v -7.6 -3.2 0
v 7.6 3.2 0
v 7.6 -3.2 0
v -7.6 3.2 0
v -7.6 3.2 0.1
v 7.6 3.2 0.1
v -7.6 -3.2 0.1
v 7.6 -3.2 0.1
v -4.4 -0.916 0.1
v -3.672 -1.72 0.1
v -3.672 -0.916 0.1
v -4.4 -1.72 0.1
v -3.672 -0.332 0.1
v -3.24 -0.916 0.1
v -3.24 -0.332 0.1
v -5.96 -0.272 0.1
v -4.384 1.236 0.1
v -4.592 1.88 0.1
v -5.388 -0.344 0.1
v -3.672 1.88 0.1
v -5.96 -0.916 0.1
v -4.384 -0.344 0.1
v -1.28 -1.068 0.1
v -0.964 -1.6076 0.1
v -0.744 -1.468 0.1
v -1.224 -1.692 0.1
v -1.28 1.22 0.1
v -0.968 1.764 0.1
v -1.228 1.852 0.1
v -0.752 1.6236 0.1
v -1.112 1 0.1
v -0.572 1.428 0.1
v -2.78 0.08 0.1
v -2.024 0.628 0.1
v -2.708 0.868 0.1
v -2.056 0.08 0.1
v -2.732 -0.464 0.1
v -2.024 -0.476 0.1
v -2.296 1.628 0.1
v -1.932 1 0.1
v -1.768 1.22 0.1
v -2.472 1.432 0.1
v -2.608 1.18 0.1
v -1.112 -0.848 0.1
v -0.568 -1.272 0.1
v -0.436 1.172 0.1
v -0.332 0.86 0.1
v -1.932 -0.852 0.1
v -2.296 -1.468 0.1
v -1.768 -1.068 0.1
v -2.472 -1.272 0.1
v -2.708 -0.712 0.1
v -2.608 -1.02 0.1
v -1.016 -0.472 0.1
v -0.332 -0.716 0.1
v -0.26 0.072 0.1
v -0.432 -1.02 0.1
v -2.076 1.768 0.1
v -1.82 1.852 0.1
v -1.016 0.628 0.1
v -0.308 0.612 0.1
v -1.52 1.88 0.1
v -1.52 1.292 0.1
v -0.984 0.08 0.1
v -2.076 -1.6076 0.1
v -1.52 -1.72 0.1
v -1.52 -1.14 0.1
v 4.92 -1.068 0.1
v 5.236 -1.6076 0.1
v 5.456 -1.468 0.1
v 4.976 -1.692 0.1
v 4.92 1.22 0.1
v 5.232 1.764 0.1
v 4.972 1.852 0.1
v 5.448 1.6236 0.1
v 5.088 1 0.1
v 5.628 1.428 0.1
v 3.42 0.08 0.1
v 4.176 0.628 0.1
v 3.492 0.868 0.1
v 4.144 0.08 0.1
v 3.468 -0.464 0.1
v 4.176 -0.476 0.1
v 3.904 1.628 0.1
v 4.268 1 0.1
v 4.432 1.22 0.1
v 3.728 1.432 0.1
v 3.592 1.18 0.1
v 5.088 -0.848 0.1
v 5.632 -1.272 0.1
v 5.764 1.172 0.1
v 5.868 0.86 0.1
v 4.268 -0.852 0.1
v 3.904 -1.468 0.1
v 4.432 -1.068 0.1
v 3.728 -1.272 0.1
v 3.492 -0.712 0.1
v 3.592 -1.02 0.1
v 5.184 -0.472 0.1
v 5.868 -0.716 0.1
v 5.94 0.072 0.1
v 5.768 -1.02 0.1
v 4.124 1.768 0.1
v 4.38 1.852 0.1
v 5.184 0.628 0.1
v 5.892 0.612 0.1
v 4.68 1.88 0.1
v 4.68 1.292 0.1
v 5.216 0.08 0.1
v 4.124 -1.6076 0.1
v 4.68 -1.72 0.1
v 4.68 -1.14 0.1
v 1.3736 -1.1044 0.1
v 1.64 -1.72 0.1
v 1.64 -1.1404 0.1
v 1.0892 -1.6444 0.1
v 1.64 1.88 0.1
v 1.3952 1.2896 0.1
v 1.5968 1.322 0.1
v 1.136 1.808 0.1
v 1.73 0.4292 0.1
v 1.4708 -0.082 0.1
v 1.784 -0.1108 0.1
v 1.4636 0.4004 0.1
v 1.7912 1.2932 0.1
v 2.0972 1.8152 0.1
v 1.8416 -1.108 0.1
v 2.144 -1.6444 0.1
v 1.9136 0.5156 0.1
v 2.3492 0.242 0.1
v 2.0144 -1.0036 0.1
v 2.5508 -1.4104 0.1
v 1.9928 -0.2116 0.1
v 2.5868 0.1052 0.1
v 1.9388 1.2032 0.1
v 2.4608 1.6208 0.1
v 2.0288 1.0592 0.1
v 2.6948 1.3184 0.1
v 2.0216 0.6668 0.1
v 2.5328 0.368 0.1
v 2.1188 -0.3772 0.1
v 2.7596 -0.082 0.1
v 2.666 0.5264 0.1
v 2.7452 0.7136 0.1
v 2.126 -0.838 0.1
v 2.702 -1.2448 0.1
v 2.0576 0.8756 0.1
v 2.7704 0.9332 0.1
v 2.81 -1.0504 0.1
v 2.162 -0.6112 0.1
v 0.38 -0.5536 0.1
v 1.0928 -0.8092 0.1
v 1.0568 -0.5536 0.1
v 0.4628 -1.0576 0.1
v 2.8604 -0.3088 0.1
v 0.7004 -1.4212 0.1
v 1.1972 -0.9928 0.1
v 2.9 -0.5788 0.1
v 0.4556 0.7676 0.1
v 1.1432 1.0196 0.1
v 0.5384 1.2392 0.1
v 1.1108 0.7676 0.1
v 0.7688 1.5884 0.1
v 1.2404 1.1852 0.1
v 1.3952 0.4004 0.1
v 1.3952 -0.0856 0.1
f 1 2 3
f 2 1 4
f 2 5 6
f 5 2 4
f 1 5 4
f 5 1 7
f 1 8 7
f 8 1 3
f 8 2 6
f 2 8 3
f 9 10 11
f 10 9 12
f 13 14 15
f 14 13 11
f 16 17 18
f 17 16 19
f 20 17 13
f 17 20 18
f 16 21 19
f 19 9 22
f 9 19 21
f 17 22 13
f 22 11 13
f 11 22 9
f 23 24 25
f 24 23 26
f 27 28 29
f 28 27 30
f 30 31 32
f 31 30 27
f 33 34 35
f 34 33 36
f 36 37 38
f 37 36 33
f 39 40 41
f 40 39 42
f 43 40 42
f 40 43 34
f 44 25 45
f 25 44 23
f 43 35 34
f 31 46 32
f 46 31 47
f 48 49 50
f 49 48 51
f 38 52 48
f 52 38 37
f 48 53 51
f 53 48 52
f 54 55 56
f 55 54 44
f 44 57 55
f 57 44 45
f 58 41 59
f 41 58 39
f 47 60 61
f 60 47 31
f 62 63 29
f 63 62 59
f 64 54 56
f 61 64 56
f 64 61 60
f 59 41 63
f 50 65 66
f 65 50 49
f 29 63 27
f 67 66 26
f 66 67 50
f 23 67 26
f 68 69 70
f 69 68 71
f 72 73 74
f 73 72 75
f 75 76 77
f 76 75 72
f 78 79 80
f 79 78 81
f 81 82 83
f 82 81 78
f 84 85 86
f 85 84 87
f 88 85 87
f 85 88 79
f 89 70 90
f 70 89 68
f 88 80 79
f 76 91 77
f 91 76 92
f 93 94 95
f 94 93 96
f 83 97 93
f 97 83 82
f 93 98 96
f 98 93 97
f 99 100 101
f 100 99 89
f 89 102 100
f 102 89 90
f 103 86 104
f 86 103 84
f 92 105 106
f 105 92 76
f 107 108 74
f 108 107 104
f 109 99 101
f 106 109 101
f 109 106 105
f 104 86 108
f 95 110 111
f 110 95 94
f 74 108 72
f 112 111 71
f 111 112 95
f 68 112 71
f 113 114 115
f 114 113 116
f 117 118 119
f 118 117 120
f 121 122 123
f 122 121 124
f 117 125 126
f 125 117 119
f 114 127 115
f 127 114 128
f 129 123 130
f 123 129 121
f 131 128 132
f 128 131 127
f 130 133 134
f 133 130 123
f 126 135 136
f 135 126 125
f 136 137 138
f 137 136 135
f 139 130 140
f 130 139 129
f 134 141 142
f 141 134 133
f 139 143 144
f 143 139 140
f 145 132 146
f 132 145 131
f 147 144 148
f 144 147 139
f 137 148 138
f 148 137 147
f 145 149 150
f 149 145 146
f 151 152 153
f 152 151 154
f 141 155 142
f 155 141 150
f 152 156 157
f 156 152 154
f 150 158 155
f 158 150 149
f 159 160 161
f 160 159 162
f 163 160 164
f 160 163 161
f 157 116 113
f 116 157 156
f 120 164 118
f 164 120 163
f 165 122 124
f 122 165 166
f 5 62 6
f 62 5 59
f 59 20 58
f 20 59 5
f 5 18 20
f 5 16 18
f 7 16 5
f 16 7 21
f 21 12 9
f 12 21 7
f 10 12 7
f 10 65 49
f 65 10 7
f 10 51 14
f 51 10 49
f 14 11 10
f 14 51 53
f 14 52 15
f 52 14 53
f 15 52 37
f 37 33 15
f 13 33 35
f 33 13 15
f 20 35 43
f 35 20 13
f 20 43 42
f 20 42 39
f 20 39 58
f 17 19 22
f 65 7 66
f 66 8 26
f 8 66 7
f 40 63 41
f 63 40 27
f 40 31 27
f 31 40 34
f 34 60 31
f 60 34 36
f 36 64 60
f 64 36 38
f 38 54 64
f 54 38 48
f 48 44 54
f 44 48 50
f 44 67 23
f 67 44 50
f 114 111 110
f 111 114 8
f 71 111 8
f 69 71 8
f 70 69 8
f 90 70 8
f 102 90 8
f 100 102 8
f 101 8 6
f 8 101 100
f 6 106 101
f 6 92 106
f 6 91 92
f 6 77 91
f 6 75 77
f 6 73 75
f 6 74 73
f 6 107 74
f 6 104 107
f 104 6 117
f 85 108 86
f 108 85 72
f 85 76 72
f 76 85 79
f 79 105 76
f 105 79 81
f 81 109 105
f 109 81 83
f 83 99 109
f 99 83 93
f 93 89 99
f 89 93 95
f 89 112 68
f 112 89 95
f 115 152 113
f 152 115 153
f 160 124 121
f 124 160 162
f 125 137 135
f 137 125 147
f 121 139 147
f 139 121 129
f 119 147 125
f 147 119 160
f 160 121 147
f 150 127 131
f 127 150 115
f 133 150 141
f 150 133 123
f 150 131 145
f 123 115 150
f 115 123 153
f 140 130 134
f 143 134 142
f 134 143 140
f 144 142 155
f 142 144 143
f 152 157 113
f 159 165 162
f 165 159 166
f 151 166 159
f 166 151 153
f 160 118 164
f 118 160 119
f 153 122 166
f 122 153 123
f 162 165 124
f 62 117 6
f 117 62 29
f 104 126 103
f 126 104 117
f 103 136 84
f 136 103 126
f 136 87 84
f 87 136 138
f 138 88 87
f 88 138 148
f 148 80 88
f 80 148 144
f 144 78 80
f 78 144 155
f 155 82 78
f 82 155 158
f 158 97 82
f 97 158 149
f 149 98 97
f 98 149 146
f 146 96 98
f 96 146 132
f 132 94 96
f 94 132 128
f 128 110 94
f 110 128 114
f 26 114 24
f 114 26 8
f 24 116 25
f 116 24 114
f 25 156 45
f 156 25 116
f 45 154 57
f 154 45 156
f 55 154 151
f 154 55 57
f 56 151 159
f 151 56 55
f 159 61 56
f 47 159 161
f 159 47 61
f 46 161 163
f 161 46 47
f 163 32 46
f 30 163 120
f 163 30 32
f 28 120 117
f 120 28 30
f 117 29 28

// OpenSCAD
// file: ../p/box5-12.scad
use <../lib.scad>
function ldraw_lib__box5_12() = [
// 0 Box with 5 Faces without Any Edges
// 0 Name: box5-12.dat
// 0 Author: Chris Dee [cwdee]
// 0 !LDRAW_ORG Primitive UPDATE 2009-02
// 0 !LICENSE Licensed under CC BY 4.0 : see CAreadme.txt
// 
// 0 BFC CERTIFY CCW
  [0,"BFC","CERTIFY"],
  [0,"BFC","CCW"],
// 
// 0 !HISTORY 2009-09-03 [PTadmin] Official Update 2009-02
// 
// 
// 4 16 1 1 1 1 1 -1 -1 1 -1 -1 1 1
  [4,16,1,1,1,1,1,-1,-1,1,-1,-1,1,1],
// 4 16 -1 0 1 1 0 1 1 1 1 -1 1 1
  [4,16,-1,0,1,1,0,1,1,1,1,-1,1,1],
// 4 16 -1 0 -1 -1 0 1 -1 1 1 -1 1 -1
  [4,16,-1,0,-1,-1,0,1,-1,1,1,-1,1,-1],
// 4 16 1 0 -1 -1 0 -1 -1 1 -1 1 1 -1
  [4,16,1,0,-1,-1,0,-1,-1,1,-1,1,1,-1],
// 4 16 1 0 1 1 0 -1 1 1 -1 1 1 1
  [4,16,1,0,1,1,0,-1,1,1,-1,1,1,1],
// 0
];
module ldraw_lib__box5_12(step=0, col=false, unit=2/5, alt=false, line=0.2, solid=!$preview)
    makepoly(ldraw_lib__box5_12(), step=step, col=col, unit=unit, alt=alt, line=line, solid=solid);
ldraw_lib__box5_12(line=0.2);
// main file
use <../lib.scad>
use <../p/box5-12.scad>
function ldraw_lib__197895c() = [
// 0 Sticker  0.8 x  1.9 with White "4030" on Transparent Background
// 0 Name: 197895c.dat
// 0 Author: Takeshi Takahashi [RainbowDolphin]
// 0 !LDRAW_ORG Part UPDATE 2025-08
// 0 !LICENSE Licensed under CC BY 4.0 : see CAreadme.txt
// 
// 0 BFC CERTIFY CCW
  [0,"BFC","CERTIFY"],
  [0,"BFC","CCW"],
// 
// 0 !KEYWORDS boat, BrickLink 4030stk01, Cargo carrier, Freighter
// 0 !KEYWORDS Rebrickable 197895, Set 4030, ship
// 
// 0 !HISTORY 2025-08-31 [OrionP] Official Update 2025-08
// 
// 1 16 0 -0.25 0 19 0 0 0 0.25 0 0 0 8 box5-12.dat
  [1,16,0,-0.25,0,19,0,0,0,0.25,0,0,0,8, ldraw_lib__box5_12()],
// 0 BFC NOCLIP
  [0,"BFC","NOCLIP"],
// 4 15 -11 -0.25 -4.3 -9.18 -0.25 -4.3 -9.18 -0.25 -2.29 -11 -0.25 -2.29
  [4,15,-11,-0.25,-4.3,-9.18,-0.25,-4.3,-9.18,-0.25,-2.29,-11,-0.25,-2.29],
// 4 15 -9.18 -0.25 -0.83 -9.18 -0.25 -2.29 -8.1 -0.25 -2.29 -8.1 -0.25 -0.83
  [4,15,-9.18,-0.25,-0.83,-9.18,-0.25,-2.29,-8.1,-0.25,-2.29,-8.1,-0.25,-0.83],
// 4 15 -13.47 -0.25 -0.86 -10.96 -0.25 3.09 -11.48 -0.25 4.7 -14.9 -0.25 -0.68
  [4,15,-13.47,-0.25,-0.86,-10.96,-0.25,3.09,-11.48,-0.25,4.7,-14.9,-0.25,-0.68],
// 4 15 -9.18 -0.25 4.7 -11.48 -0.25 4.7 -10.96 -0.25 3.09 -9.18 -0.25 -0.83
  [4,15,-9.18,-0.25,4.7,-11.48,-0.25,4.7,-10.96,-0.25,3.09,-9.18,-0.25,-0.83],
// 3 15 -14.9 -0.25 -0.68 -14.9 -0.25 -2.29 -13.47 -0.25 -0.86
  [3,15,-14.9,-0.25,-0.68,-14.9,-0.25,-2.29,-13.47,-0.25,-0.86],
// 4 15 -10.96 -0.25 -0.86 -13.47 -0.25 -0.86 -14.9 -0.25 -2.29 -11 -0.25 -2.29
  [4,15,-10.96,-0.25,-0.86,-13.47,-0.25,-0.86,-14.9,-0.25,-2.29,-11,-0.25,-2.29],
// 3 15 -10.96 -0.25 3.09 -10.96 -0.25 -0.86 -9.18 -0.25 -0.83
  [3,15,-10.96,-0.25,3.09,-10.96,-0.25,-0.86,-9.18,-0.25,-0.83],
// 4 15 -11 -0.25 -2.29 -9.18 -0.25 -2.29 -9.18 -0.25 -0.83 -10.96 -0.25 -0.86
  [4,15,-11,-0.25,-2.29,-9.18,-0.25,-2.29,-9.18,-0.25,-0.83,-10.96,-0.25,-0.86],
// 4 15 -1.86 -0.25 -3.67 -3.2 -0.25 -2.67 -3.06 -0.25 -4.23 -2.41 -0.25 -4.019
  [4,15,-1.86,-0.25,-3.67,-3.2,-0.25,-2.67,-3.06,-0.25,-4.23,-2.41,-0.25,-4.019],
// 4 15 -3.07 -0.25 4.63 -3.2 -0.25 3.05 -1.88 -0.25 4.059 -2.42 -0.25 4.41
  [4,15,-3.07,-0.25,4.63,-3.2,-0.25,3.05,-1.88,-0.25,4.059,-2.42,-0.25,4.41],
// 4 15 -1.43 -.25 3.57 -1.88 -.25 4.059 -3.2 -.25 3.05 -2.78 -.25 2.5
  [4,15,-1.43,-.25,3.57,-1.88,-.25,4.059,-3.2,-.25,3.05,-2.78,-.25,2.5],
// 4 15 -6.77 -0.25 2.17 -6.95 -0.25 0.2 -5.14 -0.25 0.2 -5.06 -0.25 1.57
  [4,15,-6.77,-0.25,2.17,-6.95,-0.25,0.2,-5.14,-0.25,0.2,-5.06,-0.25,1.57],
// 4 15 -6.95 -0.25 0.2 -6.83 -0.25 -1.16 -5.06 -0.25 -1.19 -5.14 -0.25 0.2
  [4,15,-6.95,-0.25,0.2,-6.83,-0.25,-1.16,-5.06,-0.25,-1.19,-5.14,-0.25,0.2],
// 4 15 -4.42 -0.25 3.05 -5.74 -0.25 4.07 -6.18 -0.25 3.58 -4.83 -0.25 2.5
  [4,15,-4.42,-0.25,3.05,-5.74,-0.25,4.07,-6.18,-0.25,3.58,-4.83,-0.25,2.5],
// 4 15 -4.83 -0.25 2.5 -6.18 -0.25 3.58 -6.52 -0.25 2.95 -5.06 -0.25 1.57
  [4,15,-4.83,-0.25,2.5,-6.18,-0.25,3.58,-6.52,-0.25,2.95,-5.06,-0.25,1.57],
// 4 15 -3.2 -0.25 -2.67 -1.86 -0.25 -3.67 -1.42 -0.25 -3.18 -2.78 -0.25 -2.12
  [4,15,-3.2,-0.25,-2.67,-1.86,-0.25,-3.67,-1.42,-0.25,-3.18,-2.78,-0.25,-2.12],
// 3 15 -6.52 -0.25 2.95 -6.77 -0.25 2.17 -5.06 -0.25 1.57
  [3,15,-6.52,-0.25,2.95,-6.77,-0.25,2.17,-5.06,-0.25,1.57],
// 4 15 -.83 -.25 2.15 -1.09 -.25 2.93 -1.43 -.25 3.57 -2.78 -.25 2.5
  [4,15,-.83,-.25,2.15,-1.09,-.25,2.93,-1.43,-.25,3.57,-2.78,-.25,2.5],
// 4 15 -4.42 -0.25 -2.67 -4.83 -0.25 -2.13 -6.18 -0.25 -3.18 -5.74 -0.25 -3.67
  [4,15,-4.42,-0.25,-2.67,-4.83,-0.25,-2.13,-6.18,-0.25,-3.18,-5.74,-0.25,-3.67],
// 4 15 -6.83 -.25 -1.16 -6.77 -.25 -1.78 -4.83 -.25 -2.13 -5.06 -.25 -1.19
  [4,15,-6.83,-.25,-1.16,-6.77,-.25,-1.78,-4.83,-.25,-2.13,-5.06,-.25,-1.19],
// 4 15 -6.77 -.25 -1.78 -6.52 -.25 -2.55 -6.18 -.25 -3.18 -4.83 -.25 -2.13
  [4,15,-6.77,-.25,-1.78,-6.52,-.25,-2.55,-6.18,-.25,-3.18,-4.83,-.25,-2.13],
// 4 15 -0.65 -0.25 0.18 -2.54 -0.25 -1.18 -2.78 -0.25 -2.12 -0.83 -0.25 -1.79
  [4,15,-0.65,-0.25,0.18,-2.54,-0.25,-1.18,-2.78,-0.25,-2.12,-0.83,-0.25,-1.79],
// 4 15 -1.42 -0.25 -3.18 -1.08 -0.25 -2.55 -0.83 -0.25 -1.79 -2.78 -0.25 -2.12
  [4,15,-1.42,-0.25,-3.18,-1.08,-0.25,-2.55,-0.83,-0.25,-1.79,-2.78,-0.25,-2.12],
// 4 15 -5.74 -0.25 4.07 -4.42 -0.25 3.05 -4.55 -0.25 4.63 -5.19 -0.25 4.42
  [4,15,-5.74,-0.25,4.07,-4.42,-0.25,3.05,-4.55,-0.25,4.63,-5.19,-0.25,4.42],
// 4 15 -2.78 -.25 2.5 -2.54 -.25 1.57 -.77 -.25 1.53 -.83 -.25 2.15
  [4,15,-2.78,-.25,2.5,-2.54,-.25,1.57,-.77,-.25,1.53,-.83,-.25,2.15],
// 4 15 -3.07 -0.25 4.63 -3.8 -0.25 4.7 -4.55 -0.25 4.63 -3.8 -0.25 3.23
  [4,15,-3.07,-0.25,4.63,-3.8,-0.25,4.7,-4.55,-0.25,4.63,-3.8,-0.25,3.23],
// 3 15 -2.46 -0.25 0.2 -2.54 -0.25 -1.18 -0.65 -0.25 0.18
  [3,15,-2.46,-0.25,0.2,-2.54,-0.25,-1.18,-0.65,-0.25,0.18],
// 4 15 -2.54 -0.25 1.57 -2.46 -0.25 0.2 -0.65 -0.25 0.18 -0.77 -0.25 1.53
  [4,15,-2.54,-0.25,1.57,-2.46,-0.25,0.2,-0.65,-0.25,0.18,-0.77,-0.25,1.53],
// 3 15 -4.55 -0.25 4.63 -4.42 -0.25 3.05 -3.8 -0.25 3.23
  [3,15,-4.55,-0.25,4.63,-4.42,-0.25,3.05,-3.8,-0.25,3.23],
// 4 15 -5.74 -0.25 -3.67 -5.19 -0.25 -4.019 -3.8 -0.25 -4.3 -4.42 -0.25 -2.67
  [4,15,-5.74,-0.25,-3.67,-5.19,-0.25,-4.019,-3.8,-0.25,-4.3,-4.42,-0.25,-2.67],
// 3 15 -3.07 -0.25 4.63 -3.8 -0.25 3.23 -3.2 -0.25 3.05
  [3,15,-3.07,-0.25,4.63,-3.8,-0.25,3.23,-3.2,-0.25,3.05],
// 4 15 -4.42 -0.25 -2.67 -3.8 -0.25 -4.3 -3.06 -0.25 -4.23 -3.8 -0.25 -2.85
  [4,15,-4.42,-0.25,-2.67,-3.8,-0.25,-4.3,-3.06,-0.25,-4.23,-3.8,-0.25,-2.85],
// 3 15 -3.2 -0.25 -2.67 -3.8 -0.25 -2.85 -3.06 -0.25 -4.23
  [3,15,-3.2,-0.25,-2.67,-3.8,-0.25,-2.85,-3.06,-0.25,-4.23],
// 4 15 13.64 -0.25 -3.67 12.3 -0.25 -2.67 12.44 -0.25 -4.23 13.09 -0.25 -4.019
  [4,15,13.64,-0.25,-3.67,12.3,-0.25,-2.67,12.44,-0.25,-4.23,13.09,-0.25,-4.019],
// 4 15 12.43 -0.25 4.63 12.3 -0.25 3.05 13.62 -0.25 4.059 13.08 -0.25 4.41
  [4,15,12.43,-0.25,4.63,12.3,-0.25,3.05,13.62,-0.25,4.059,13.08,-0.25,4.41],
// 4 15 14.07 -0.25 3.57 13.62 -0.25 4.059 12.3 -0.25 3.05 12.72 -0.25 2.5
  [4,15,14.07,-0.25,3.57,13.62,-0.25,4.059,12.3,-0.25,3.05,12.72,-0.25,2.5],
// 4 15 8.73 -0.25 2.17 8.55 -0.25 0.2 10.36 -0.25 0.2 10.44 -0.25 1.57
  [4,15,8.73,-0.25,2.17,8.55,-0.25,0.2,10.36,-0.25,0.2,10.44,-0.25,1.57],
// 4 15 8.55 -0.25 0.2 8.67 -0.25 -1.16 10.44 -0.25 -1.19 10.36 -0.25 0.2
  [4,15,8.55,-0.25,0.2,8.67,-0.25,-1.16,10.44,-0.25,-1.19,10.36,-0.25,0.2],
// 4 15 11.08 -0.25 3.05 9.76 -0.25 4.07 9.32 -0.25 3.58 10.67 -0.25 2.5
  [4,15,11.08,-0.25,3.05,9.76,-0.25,4.07,9.32,-0.25,3.58,10.67,-0.25,2.5],
// 4 15 10.67 -0.25 2.5 9.32 -0.25 3.58 8.98 -0.25 2.95 10.44 -0.25 1.57
  [4,15,10.67,-0.25,2.5,9.32,-0.25,3.58,8.98,-0.25,2.95,10.44,-0.25,1.57],
// 4 15 12.3 -0.25 -2.67 13.64 -0.25 -3.67 14.08 -0.25 -3.18 12.72 -0.25 -2.12
  [4,15,12.3,-0.25,-2.67,13.64,-0.25,-3.67,14.08,-0.25,-3.18,12.72,-0.25,-2.12],
// 3 15 8.98 -0.25 2.95 8.73 -0.25 2.17 10.44 -0.25 1.57
  [3,15,8.98,-0.25,2.95,8.73,-0.25,2.17,10.44,-0.25,1.57],
// 4 15 14.67 -0.25 2.15 14.41 -0.25 2.93 14.07 -0.25 3.57 12.72 -0.25 2.5
  [4,15,14.67,-0.25,2.15,14.41,-0.25,2.93,14.07,-0.25,3.57,12.72,-0.25,2.5],
// 4 15 11.08 -0.25 -2.67 10.67 -0.25 -2.13 9.32 -0.25 -3.18 9.76 -0.25 -3.67
  [4,15,11.08,-0.25,-2.67,10.67,-0.25,-2.13,9.32,-0.25,-3.18,9.76,-0.25,-3.67],
// 4 15 8.67 -0.25 -1.16 8.73 -0.25 -1.78 10.67 -0.25 -2.13 10.44 -0.25 -1.19
  [4,15,8.67,-0.25,-1.16,8.73,-0.25,-1.78,10.67,-0.25,-2.13,10.44,-0.25,-1.19],
// 4 15 8.73 -0.25 -1.78 8.98 -0.25 -2.55 9.32 -0.25 -3.18 10.67 -0.25 -2.13
  [4,15,8.73,-0.25,-1.78,8.98,-0.25,-2.55,9.32,-0.25,-3.18,10.67,-0.25,-2.13],
// 4 15 14.85 -0.25 0.18 12.96 -0.25 -1.18 12.72 -0.25 -2.12 14.67 -0.25 -1.79
  [4,15,14.85,-0.25,0.18,12.96,-0.25,-1.18,12.72,-0.25,-2.12,14.67,-0.25,-1.79],
// 4 15 14.08 -0.25 -3.18 14.42 -0.25 -2.55 14.67 -0.25 -1.79 12.72 -0.25 -2.12
  [4,15,14.08,-0.25,-3.18,14.42,-0.25,-2.55,14.67,-0.25,-1.79,12.72,-0.25,-2.12],
// 4 15 9.76 -0.25 4.07 11.08 -0.25 3.05 10.95 -0.25 4.63 10.31 -0.25 4.42
  [4,15,9.76,-0.25,4.07,11.08,-0.25,3.05,10.95,-0.25,4.63,10.31,-0.25,4.42],
// 4 15 12.72 -0.25 2.5 12.96 -0.25 1.57 14.73 -0.25 1.53 14.67 -0.25 2.15
  [4,15,12.72,-0.25,2.5,12.96,-0.25,1.57,14.73,-0.25,1.53,14.67,-0.25,2.15],
// 4 15 12.43 -0.25 4.63 11.7 -0.25 4.7 10.95 -0.25 4.63 11.7 -0.25 3.23
  [4,15,12.43,-0.25,4.63,11.7,-0.25,4.7,10.95,-0.25,4.63,11.7,-0.25,3.23],
// 3 15 13.04 -0.25 0.2 12.96 -0.25 -1.18 14.85 -0.25 0.18
  [3,15,13.04,-0.25,0.2,12.96,-0.25,-1.18,14.85,-0.25,0.18],
// 4 15 12.96 -0.25 1.57 13.04 -0.25 0.2 14.85 -0.25 0.18 14.73 -0.25 1.53
  [4,15,12.96,-0.25,1.57,13.04,-0.25,0.2,14.85,-0.25,0.18,14.73,-0.25,1.53],
// 3 15 10.95 -0.25 4.63 11.08 -0.25 3.05 11.7 -0.25 3.23
  [3,15,10.95,-0.25,4.63,11.08,-0.25,3.05,11.7,-0.25,3.23],
// 4 15 9.76 -0.25 -3.67 10.31 -0.25 -4.019 11.7 -0.25 -4.3 11.08 -0.25 -2.67
  [4,15,9.76,-0.25,-3.67,10.31,-0.25,-4.019,11.7,-0.25,-4.3,11.08,-0.25,-2.67],
// 3 15 12.43 -0.25 4.63 11.7 -0.25 3.23 12.3 -0.25 3.05
  [3,15,12.43,-0.25,4.63,11.7,-0.25,3.23,12.3,-0.25,3.05],
// 4 15 11.08 -0.25 -2.67 11.7 -0.25 -4.3 12.44 -0.25 -4.23 11.7 -0.25 -2.85
  [4,15,11.08,-0.25,-2.67,11.7,-0.25,-4.3,12.44,-0.25,-4.23,11.7,-0.25,-2.85],
// 3 15 12.3 -0.25 -2.67 11.7 -0.25 -2.85 12.44 -0.25 -4.23
  [3,15,12.3,-0.25,-2.67,11.7,-0.25,-2.85,12.44,-0.25,-4.23],
// 4 15 4.1 -0.25 -2.851 3.434 -0.25 -2.761 2.723 -0.25 -4.111 4.1 -0.25 -4.3
  [4,15,4.1,-0.25,-2.851,3.434,-0.25,-2.761,2.723,-0.25,-4.111,4.1,-0.25,-4.3],
// 4 15 2.84 -0.25 4.52 3.488 -0.25 3.224 3.992 -0.25 3.305 4.1 -0.25 4.7
  [4,15,2.84,-0.25,4.52,3.488,-0.25,3.224,3.992,-0.25,3.305,4.1,-0.25,4.7],
// 4 15 3.659 -0.25 1.001 3.677 -0.25 -0.205 4.46 -0.25 -0.277 4.325 -0.25 1.073
  [4,15,3.659,-0.25,1.001,3.677,-0.25,-0.205,4.46,-0.25,-0.277,4.325,-0.25,1.073],
// 4 15 5.243 -0.25 4.538 4.1 -0.25 4.7 3.992 -0.25 3.305 4.478 -0.25 3.233
  [4,15,5.243,-0.25,4.538,4.1,-0.25,4.7,3.992,-0.25,3.305,4.478,-0.25,3.233],
// 4 15 5.36 -0.25 -4.111 4.604 -0.25 -2.77 4.1 -0.25 -2.851 4.1 -0.25 -4.3
  [4,15,5.36,-0.25,-4.111,4.604,-0.25,-2.77,4.1,-0.25,-2.851,4.1,-0.25,-4.3],
// 4 15 5.873 -0.25 0.605 4.784 -0.25 1.289 4.325 -0.25 1.073 4.46 -0.25 -0.277
  [4,15,5.873,-0.25,0.605,4.784,-0.25,1.289,4.325,-0.25,1.073,4.46,-0.25,-0.277],
// 4 15 6.377 -0.25 -3.526 5.036 -0.25 -2.509 4.604 -0.25 -2.77 5.36 -0.25 -4.111
  [4,15,6.377,-0.25,-3.526,5.036,-0.25,-2.509,4.604,-0.25,-2.77,5.36,-0.25,-4.111],
// 4 15 6.467 -0.25 0.263 5.873 -0.25 0.605 4.46 -0.25 -0.277 4.982 -0.25 -0.529
  [4,15,6.467,-0.25,0.263,5.873,-0.25,0.605,4.46,-0.25,-0.277,4.982,-0.25,-0.529],
// 4 15 4.478 -0.25 3.233 4.847 -0.25 3.008 6.152 -0.25 4.052 5.243 -0.25 4.538
  [4,15,4.478,-0.25,3.233,4.847,-0.25,3.008,6.152,-0.25,4.052,5.243,-0.25,4.538],
// 4 15 6.737 -0.25 3.296 6.152 -0.25 4.052 4.847 -0.25 3.008 5.072 -0.25 2.648
  [4,15,6.737,-0.25,3.296,6.152,-0.25,4.052,4.847,-0.25,3.008,5.072,-0.25,2.648],
// 4 15 4.784 -0.25 1.289 5.873 -0.25 0.605 6.332 -0.25 0.92 5.054 -0.25 1.667
  [4,15,4.784,-0.25,1.289,5.873,-0.25,0.605,6.332,-0.25,0.92,5.054,-0.25,1.667],
// 4 15 6.899 -0.25 -0.205 6.467 -0.25 0.263 4.982 -0.25 -0.529 5.297 -0.25 -0.943
  [4,15,6.899,-0.25,-0.205,6.467,-0.25,0.263,4.982,-0.25,-0.529,5.297,-0.25,-0.943],
// 4 15 5.054 -0.25 1.667 6.332 -0.25 0.92 6.665 -0.25 1.316 6.863 -0.25 1.784
  [4,15,5.054,-0.25,1.667,6.332,-0.25,0.92,6.665,-0.25,1.316,6.863,-0.25,1.784],
// 4 15 5.036 -0.25 -2.509 6.377 -0.25 -3.526 6.755 -0.25 -3.112 5.315 -0.25 -2.095
  [4,15,5.036,-0.25,-2.509,6.377,-0.25,-3.526,6.755,-0.25,-3.112,5.315,-0.25,-2.095],
// 4 15 5.144 -0.25 2.189 5.054 -0.25 1.667 6.863 -0.25 1.784 6.926 -0.25 2.333
  [4,15,5.144,-0.25,2.189,5.054,-0.25,1.667,6.863,-0.25,1.784,6.926,-0.25,2.333],
// 4 15 6.737 -0.25 3.296 5.072 -0.25 2.648 5.144 -0.25 2.189 6.926 -0.25 2.333
  [4,15,6.737,-0.25,3.296,5.072,-0.25,2.648,5.144,-0.25,2.189,6.926,-0.25,2.333],
// 4 15 6.755 -0.25 -3.112 7.025 -0.25 -2.626 5.405 -0.25 -1.528 5.315 -0.25 -2.095
  [4,15,6.755,-0.25,-3.112,7.025,-0.25,-2.626,5.405,-0.25,-1.528,5.315,-0.25,-2.095],
// 4 15 2.642 -0.25 -1.384 0.95 -0.25 -1.384 1.157 -0.25 -2.644 2.732 -0.25 -2.023
  [4,15,2.642,-0.25,-1.384,0.95,-0.25,-1.384,1.157,-0.25,-2.644,2.732,-0.25,-2.023],
// 4 15 6.899 -0.25 -0.205 5.297 -0.25 -0.943 5.405 -0.25 -1.528 7.151 -0.25 -0.772
  [4,15,6.899,-0.25,-0.205,5.297,-0.25,-0.943,5.405,-0.25,-1.528,7.151,-0.25,-0.772],
// 4 15 2.993 -0.25 -2.482 2.732 -0.25 -2.023 1.157 -0.25 -2.644 1.751 -0.25 -3.553
  [4,15,2.993,-0.25,-2.482,2.732,-0.25,-2.023,1.157,-0.25,-2.644,1.751,-0.25,-3.553],
// 4 15 7.151 -0.25 -0.772 5.405 -0.25 -1.528 7.025 -0.25 -2.626 7.25 -0.25 -1.447
  [4,15,7.151,-0.25,-0.772,5.405,-0.25,-1.528,7.025,-0.25,-2.626,7.25,-0.25,-1.447],
// 4 15 1.139 -0.25 1.919 2.777 -0.25 1.919 2.858 -0.25 2.549 1.346 -0.25 3.098
  [4,15,1.139,-0.25,1.919,2.777,-0.25,1.919,2.858,-0.25,2.549,1.346,-0.25,3.098],
// 4 15 3.101 -0.25 2.963 1.922 -0.25 3.971 1.346 -0.25 3.098 2.858 -0.25 2.549
  [4,15,3.101,-0.25,2.963,1.922,-0.25,3.971,1.346,-0.25,3.098,2.858,-0.25,2.549],
// 4 15 1.751 -0.25 -3.553 2.723 -0.25 -4.111 3.434 -0.25 -2.761 2.993 -0.25 -2.482
  [4,15,1.751,-0.25,-3.553,2.723,-0.25,-4.111,3.434,-0.25,-2.761,2.993,-0.25,-2.482],
// 4 15 1.922 -0.25 3.971 3.101 -0.25 2.963 3.488 -0.25 3.224 2.84 -0.25 4.52
  [4,15,1.922,-0.25,3.971,3.101,-0.25,2.963,3.488,-0.25,3.224,2.84,-0.25,4.52],
// 4 15 3.659 -0.25 1.001 3.488 -0.25 1.001 3.488 -0.25 -0.214 3.677 -0.25 -0.205
  [4,15,3.659,-0.25,1.001,3.488,-0.25,1.001,3.488,-0.25,-0.214,3.677,-0.25,-0.205],
// 0 BFC CLIP
  [0,"BFC","CLIP"],
// 4 16 -3.8 -0.25 4.7 19 -0.25 8 -19 -0.25 8 -4.55 -0.25 4.63
  [4,16,-3.8,-0.25,4.7,19,-0.25,8,-19,-0.25,8,-4.55,-0.25,4.63],
// 4 16 -5.19 -0.25 4.42 -4.55 -0.25 4.63 -19 -0.25 8 -9.18 -0.25 4.7
  [4,16,-5.19,-0.25,4.42,-4.55,-0.25,4.63,-19,-0.25,8,-9.18,-0.25,4.7],
// 3 16 -19 -0.25 8 -11.48 -0.25 4.7 -9.18 -0.25 4.7
  [3,16,-19,-0.25,8,-11.48,-0.25,4.7,-9.18,-0.25,4.7],
// 3 16 -19 -0.25 8 -14.9 -0.25 -0.68 -11.48 -0.25 4.7
  [3,16,-19,-0.25,8,-14.9,-0.25,-0.68,-11.48,-0.25,4.7],
// 4 16 -14.9 -0.25 -0.68 -19 -0.25 8 -19 -0.25 -8 -14.9 -0.25 -2.29
  [4,16,-14.9,-0.25,-0.68,-19,-0.25,8,-19,-0.25,-8,-14.9,-0.25,-2.29],
// 4 16 -11 -0.25 -2.29 -14.9 -0.25 -2.29 -19 -0.25 -8 -11 -0.25 -4.3
  [4,16,-11,-0.25,-2.29,-14.9,-0.25,-2.29,-19,-0.25,-8,-11,-0.25,-4.3],
// 3 16 -9.18 -0.25 -4.3 -11 -0.25 -4.3 -19 -0.25 -8
  [3,16,-9.18,-0.25,-4.3,-11,-0.25,-4.3,-19,-0.25,-8],
// 4 16 -9.18 -0.25 -4.3 -19 -0.25 -8 -5.19 -0.25 -4.019 -5.74 -0.25 -3.67
  [4,16,-9.18,-0.25,-4.3,-19,-0.25,-8,-5.19,-0.25,-4.019,-5.74,-0.25,-3.67],
// 4 16 -9.18 -0.25 -4.3 -5.74 -0.25 -3.67 -6.18 -0.25 -3.18 -8.1 -0.25 -2.29
  [4,16,-9.18,-0.25,-4.3,-5.74,-0.25,-3.67,-6.18,-0.25,-3.18,-8.1,-0.25,-2.29],
// 3 16 -8.1 -0.25 -2.29 -9.18 -0.25 -2.29 -9.18 -0.25 -4.3
  [3,16,-8.1,-0.25,-2.29,-9.18,-0.25,-2.29,-9.18,-0.25,-4.3],
// 3 16 -8.1 -0.25 -2.29 -6.18 -0.25 -3.18 -6.52 -0.25 -2.55
  [3,16,-8.1,-0.25,-2.29,-6.18,-0.25,-3.18,-6.52,-0.25,-2.55],
// 4 16 -8.1 -.25 -2.29 -6.52 -.25 -2.55 -6.77 -.25 -1.78 -8.1 -.25 -.83
  [4,16,-8.1,-.25,-2.29,-6.52,-.25,-2.55,-6.77,-.25,-1.78,-8.1,-.25,-.83],
// 3 16 -8.1 -.25 -.83 -6.77 -.25 -1.78 -6.83 -.25 -1.16
  [3,16,-8.1,-.25,-.83,-6.77,-.25,-1.78,-6.83,-.25,-1.16],
// 3 16 -6.83 -.25 -1.16 -6.95 -.25 .2 -8.1 -.25 -.83
  [3,16,-6.83,-.25,-1.16,-6.95,-.25,.2,-8.1,-.25,-.83],
// 4 16 -8.1 -0.25 -0.83 -6.95 -0.25 0.2 -6.77 -0.25 2.17 -9.18 -0.25 -0.83
  [4,16,-8.1,-0.25,-0.83,-6.95,-0.25,0.2,-6.77,-0.25,2.17,-9.18,-0.25,-0.83],
// 4 16 -9.18 -0.25 4.7 -9.18 -0.25 -0.83 -6.77 -0.25 2.17 -6.52 -0.25 2.95
  [4,16,-9.18,-0.25,4.7,-9.18,-0.25,-0.83,-6.77,-0.25,2.17,-6.52,-0.25,2.95],
// 3 16 -9.18 -0.25 4.7 -6.52 -0.25 2.95 -6.18 -0.25 3.58
  [3,16,-9.18,-0.25,4.7,-6.52,-0.25,2.95,-6.18,-0.25,3.58],
// 3 16 -9.18 -0.25 4.7 -6.18 -0.25 3.58 -5.74 -0.25 4.07
  [3,16,-9.18,-0.25,4.7,-6.18,-0.25,3.58,-5.74,-0.25,4.07],
// 3 16 -9.18 -0.25 4.7 -5.74 -0.25 4.07 -5.19 -0.25 4.42
  [3,16,-9.18,-0.25,4.7,-5.74,-0.25,4.07,-5.19,-0.25,4.42],
// 3 16 -10.96 -0.25 3.09 -13.47 -0.25 -0.86 -10.96 -0.25 -0.86
  [3,16,-10.96,-0.25,3.09,-13.47,-0.25,-0.86,-10.96,-0.25,-0.86],
// 3 16 -5.19 -0.25 -4.019 -19 -0.25 -8 -3.8 -0.25 -4.3
  [3,16,-5.19,-0.25,-4.019,-19,-0.25,-8,-3.8,-0.25,-4.3],
// 4 16 -3.8 -0.25 -4.3 -19 -0.25 -8 19 -0.25 -8 -3.06 -0.25 -4.23
  [4,16,-3.8,-0.25,-4.3,-19,-0.25,-8,19,-0.25,-8,-3.06,-0.25,-4.23],
// 4 16 -3.2 -0.25 3.05 -3.8 -0.25 3.23 -4.42 -0.25 3.05 -4.83 -0.25 2.5
  [4,16,-3.2,-0.25,3.05,-3.8,-0.25,3.23,-4.42,-0.25,3.05,-4.83,-0.25,2.5],
// 4 16 -2.78 -.25 2.5 -3.2 -.25 3.05 -4.83 -.25 2.5 -5.06 -.25 1.57
  [4,16,-2.78,-.25,2.5,-3.2,-.25,3.05,-4.83,-.25,2.5,-5.06,-.25,1.57],
// 4 16 -2.54 -.25 1.57 -2.78 -.25 2.5 -5.06 -.25 1.57 -5.14 -.25 .2
  [4,16,-2.54,-.25,1.57,-2.78,-.25,2.5,-5.06,-.25,1.57,-5.14,-.25,.2],
// 4 16 -2.46 -0.25 0.2 -2.54 -0.25 1.57 -5.14 -0.25 0.2 -5.06 -0.25 -1.19
  [4,16,-2.46,-0.25,0.2,-2.54,-0.25,1.57,-5.14,-0.25,0.2,-5.06,-0.25,-1.19],
// 4 16 -2.54 -0.25 -1.18 -2.46 -0.25 0.2 -5.06 -0.25 -1.19 -4.83 -0.25 -2.13
  [4,16,-2.54,-0.25,-1.18,-2.46,-0.25,0.2,-5.06,-0.25,-1.19,-4.83,-0.25,-2.13],
// 4 16 -2.78 -0.25 -2.12 -2.54 -0.25 -1.18 -4.83 -0.25 -2.13 -4.42 -0.25 -2.67
  [4,16,-2.78,-0.25,-2.12,-2.54,-0.25,-1.18,-4.83,-0.25,-2.13,-4.42,-0.25,-2.67],
// 4 16 -3.2 -0.25 -2.67 -2.78 -0.25 -2.12 -4.42 -0.25 -2.67 -3.8 -0.25 -2.85
  [4,16,-3.2,-0.25,-2.67,-2.78,-0.25,-2.12,-4.42,-0.25,-2.67,-3.8,-0.25,-2.85],
// 4 16 19 -0.25 -8 11.7 -0.25 -4.3 10.31 -0.25 -4.019 4.1 -0.25 -4.3
  [4,16,19,-0.25,-8,11.7,-0.25,-4.3,10.31,-0.25,-4.019,4.1,-0.25,-4.3],
// 3 16 12.44 -0.25 -4.23 11.7 -0.25 -4.3 19 -0.25 -8
  [3,16,12.44,-0.25,-4.23,11.7,-0.25,-4.3,19,-0.25,-8],
// 3 16 13.09 -0.25 -4.019 12.44 -0.25 -4.23 19 -0.25 -8
  [3,16,13.09,-0.25,-4.019,12.44,-0.25,-4.23,19,-0.25,-8],
// 3 16 13.64 -0.25 -3.67 13.09 -0.25 -4.019 19 -0.25 -8
  [3,16,13.64,-0.25,-3.67,13.09,-0.25,-4.019,19,-0.25,-8],
// 3 16 14.08 -0.25 -3.18 13.64 -0.25 -3.67 19 -0.25 -8
  [3,16,14.08,-0.25,-3.18,13.64,-0.25,-3.67,19,-0.25,-8],
// 3 16 14.42 -0.25 -2.55 14.08 -0.25 -3.18 19 -0.25 -8
  [3,16,14.42,-0.25,-2.55,14.08,-0.25,-3.18,19,-0.25,-8],
// 3 16 14.67 -0.25 -1.79 14.42 -0.25 -2.55 19 -0.25 -8
  [3,16,14.67,-0.25,-1.79,14.42,-0.25,-2.55,19,-0.25,-8],
// 4 16 14.85 -0.25 0.18 14.67 -0.25 -1.79 19 -0.25 -8 19 -0.25 8
  [4,16,14.85,-0.25,0.18,14.67,-0.25,-1.79,19,-0.25,-8,19,-0.25,8],
// 3 16 19 -0.25 8 14.73 -0.25 1.53 14.85 -0.25 0.18
  [3,16,19,-0.25,8,14.73,-0.25,1.53,14.85,-0.25,0.18],
// 3 16 19 -0.25 8 14.67 -0.25 2.15 14.73 -0.25 1.53
  [3,16,19,-0.25,8,14.67,-0.25,2.15,14.73,-0.25,1.53],
// 3 16 19 -0.25 8 14.41 -0.25 2.93 14.67 -0.25 2.15
  [3,16,19,-0.25,8,14.41,-0.25,2.93,14.67,-0.25,2.15],
// 3 16 19 -0.25 8 14.07 -0.25 3.57 14.41 -0.25 2.93
  [3,16,19,-0.25,8,14.07,-0.25,3.57,14.41,-0.25,2.93],
// 3 16 19 -0.25 8 13.62 -0.25 4.059 14.07 -0.25 3.57
  [3,16,19,-0.25,8,13.62,-0.25,4.059,14.07,-0.25,3.57],
// 3 16 19 -0.25 8 13.08 -0.25 4.41 13.62 -0.25 4.059
  [3,16,19,-0.25,8,13.08,-0.25,4.41,13.62,-0.25,4.059],
// 3 16 19 -0.25 8 12.43 -0.25 4.63 13.08 -0.25 4.41
  [3,16,19,-0.25,8,12.43,-0.25,4.63,13.08,-0.25,4.41],
// 3 16 19 -0.25 8 11.7 -0.25 4.7 12.43 -0.25 4.63
  [3,16,19,-0.25,8,11.7,-0.25,4.7,12.43,-0.25,4.63],
// 4 16 10.95 -0.25 4.63 11.7 -0.25 4.7 19 -0.25 8 4.1 -0.25 4.7
  [4,16,10.95,-0.25,4.63,11.7,-0.25,4.7,19,-0.25,8,4.1,-0.25,4.7],
// 4 16 12.3 -0.25 3.05 11.7 -0.25 3.23 11.08 -0.25 3.05 10.67 -0.25 2.5
  [4,16,12.3,-0.25,3.05,11.7,-0.25,3.23,11.08,-0.25,3.05,10.67,-0.25,2.5],
// 4 16 12.72 -0.25 2.5 12.3 -0.25 3.05 10.67 -0.25 2.5 10.44 -0.25 1.57
  [4,16,12.72,-0.25,2.5,12.3,-0.25,3.05,10.67,-0.25,2.5,10.44,-0.25,1.57],
// 4 16 12.96 -0.25 1.57 12.72 -0.25 2.5 10.44 -0.25 1.57 10.36 -0.25 0.2
  [4,16,12.96,-0.25,1.57,12.72,-0.25,2.5,10.44,-0.25,1.57,10.36,-0.25,0.2],
// 4 16 13.04 -0.25 0.2 12.96 -0.25 1.57 10.36 -0.25 0.2 10.44 -0.25 -1.19
  [4,16,13.04,-0.25,0.2,12.96,-0.25,1.57,10.36,-0.25,0.2,10.44,-0.25,-1.19],
// 4 16 12.96 -0.25 -1.18 13.04 -0.25 0.2 10.44 -0.25 -1.19 10.67 -0.25 -2.13
  [4,16,12.96,-0.25,-1.18,13.04,-0.25,0.2,10.44,-0.25,-1.19,10.67,-0.25,-2.13],
// 4 16 12.72 -0.25 -2.12 12.96 -0.25 -1.18 10.67 -0.25 -2.13 11.08 -0.25 -2.67
  [4,16,12.72,-0.25,-2.12,12.96,-0.25,-1.18,10.67,-0.25,-2.13,11.08,-0.25,-2.67],
// 4 16 12.3 -0.25 -2.67 12.72 -0.25 -2.12 11.08 -0.25 -2.67 11.7 -0.25 -2.85
  [4,16,12.3,-0.25,-2.67,12.72,-0.25,-2.12,11.08,-0.25,-2.67,11.7,-0.25,-2.85],
// 4 16 3.434 -0.25 -2.761 4.1 -0.25 -2.851 2.642 -0.25 -1.384 2.732 -0.25 -2.023
  [4,16,3.434,-0.25,-2.761,4.1,-0.25,-2.851,2.642,-0.25,-1.384,2.732,-0.25,-2.023],
// 4 16 3.659 -0.25 1.001 4.325 -0.25 1.073 2.858 -0.25 2.549 2.777 -0.25 1.919
  [4,16,3.659,-0.25,1.001,4.325,-0.25,1.073,2.858,-0.25,2.549,2.777,-0.25,1.919],
// 4 16 5.144 -0.25 2.189 5.072 -0.25 2.648 4.847 -0.25 3.008 4.478 -0.25 3.233
  [4,16,5.144,-0.25,2.189,5.072,-0.25,2.648,4.847,-0.25,3.008,4.478,-0.25,3.233],
// 4 16 4.784 -0.25 1.289 5.054 -0.25 1.667 5.144 -0.25 2.189 4.325 -0.25 1.073
  [4,16,4.784,-0.25,1.289,5.054,-0.25,1.667,5.144,-0.25,2.189,4.325,-0.25,1.073],
// 4 16 5.144 -0.25 2.189 4.478 -0.25 3.233 3.992 -0.25 3.305 2.858 -0.25 2.549
  [4,16,5.144,-0.25,2.189,4.478,-0.25,3.233,3.992,-0.25,3.305,2.858,-0.25,2.549],
// 3 16 2.858 -0.25 2.549 4.325 -0.25 1.073 5.144 -0.25 2.189
  [3,16,2.858,-0.25,2.549,4.325,-0.25,1.073,5.144,-0.25,2.189],
// 4 16 5.405 -0.25 -1.528 4.1 -0.25 -2.851 4.604 -0.25 -2.77 5.036 -0.25 -2.509
  [4,16,5.405,-0.25,-1.528,4.1,-0.25,-2.851,4.604,-0.25,-2.77,5.036,-0.25,-2.509],
// 4 16 4.982 -0.25 -0.529 4.46 -0.25 -0.277 5.405 -0.25 -1.528 5.297 -0.25 -0.943
  [4,16,4.982,-0.25,-0.529,4.46,-0.25,-0.277,5.405,-0.25,-1.528,5.297,-0.25,-0.943],
// 3 16 5.405 -0.25 -1.528 5.036 -0.25 -2.509 5.315 -0.25 -2.095
  [3,16,5.405,-0.25,-1.528,5.036,-0.25,-2.509,5.315,-0.25,-2.095],
// 4 16 2.642 -0.25 -1.384 4.1 -0.25 -2.851 5.405 -0.25 -1.528 4.46 -0.25 -0.277
  [4,16,2.642,-0.25,-1.384,4.1,-0.25,-2.851,5.405,-0.25,-1.528,4.46,-0.25,-0.277],
// 3 16 6.332 -0.25 0.92 5.873 -0.25 0.605 6.467 -0.25 0.263
  [3,16,6.332,-0.25,0.92,5.873,-0.25,0.605,6.467,-0.25,0.263],
// 4 16 6.899 -0.25 -0.205 6.665 -0.25 1.316 6.332 -0.25 0.92 6.467 -0.25 0.263
  [4,16,6.899,-0.25,-0.205,6.665,-0.25,1.316,6.332,-0.25,0.92,6.467,-0.25,0.263],
// 4 16 6.665 -0.25 1.316 6.899 -0.25 -0.205 7.151 -0.25 -0.772 6.863 -0.25 1.784
  [4,16,6.665,-0.25,1.316,6.899,-0.25,-0.205,7.151,-0.25,-0.772,6.863,-0.25,1.784],
// 3 16 2.732 -0.25 -2.023 2.993 -0.25 -2.482 3.434 -0.25 -2.761
  [3,16,2.732,-0.25,-2.023,2.993,-0.25,-2.482,3.434,-0.25,-2.761],
// 4 16 3.488 -0.25 -0.214 3.488 -0.25 1.001 2.777 -0.25 1.919 1.139 -0.25 1.919
  [4,16,3.488,-0.25,-0.214,3.488,-0.25,1.001,2.777,-0.25,1.919,1.139,-0.25,1.919],
// 4 16 2.642 -0.25 -1.384 3.488 -0.25 -0.214 1.139 -0.25 1.919 0.95 -0.25 -1.384
  [4,16,2.642,-0.25,-1.384,3.488,-0.25,-0.214,1.139,-0.25,1.919,0.95,-0.25,-1.384],
// 4 16 3.992 -0.25 3.305 3.488 -0.25 3.224 3.101 -0.25 2.963 2.858 -0.25 2.549
  [4,16,3.992,-0.25,3.305,3.488,-0.25,3.224,3.101,-0.25,2.963,2.858,-0.25,2.549],
// 4 16 4.46 -0.25 -0.277 3.677 -0.25 -0.205 3.488 -0.25 -0.214 2.642 -0.25 -1.384
  [4,16,4.46,-0.25,-0.277,3.677,-0.25,-0.205,3.488,-0.25,-0.214,2.642,-0.25,-1.384],
// 3 16 2.777 -0.25 1.919 3.488 -0.25 1.001 3.659 -0.25 1.001
  [3,16,2.777,-0.25,1.919,3.488,-0.25,1.001,3.659,-0.25,1.001],
// 4 16 4.1 -0.25 4.7 19 -0.25 8 -3.8 -0.25 4.7 -3.07 -0.25 4.63
  [4,16,4.1,-0.25,4.7,19,-0.25,8,-3.8,-0.25,4.7,-3.07,-0.25,4.63],
// 4 16 10.95 -0.25 4.63 4.1 -0.25 4.7 5.243 -0.25 4.538 10.31 -0.25 4.42
  [4,16,10.95,-0.25,4.63,4.1,-0.25,4.7,5.243,-0.25,4.538,10.31,-0.25,4.42],
// 4 16 10.31 -0.25 4.42 5.243 -0.25 4.538 6.152 -0.25 4.052 9.76 -0.25 4.07
  [4,16,10.31,-0.25,4.42,5.243,-0.25,4.538,6.152,-0.25,4.052,9.76,-0.25,4.07],
// 4 16 9.76 -0.25 4.07 6.152 -0.25 4.052 6.737 -0.25 3.296 9.32 -0.25 3.58
  [4,16,9.76,-0.25,4.07,6.152,-0.25,4.052,6.737,-0.25,3.296,9.32,-0.25,3.58],
// 4 16 8.98 -0.25 2.95 9.32 -0.25 3.58 6.737 -0.25 3.296 6.926 -0.25 2.333
  [4,16,8.98,-0.25,2.95,9.32,-0.25,3.58,6.737,-0.25,3.296,6.926,-0.25,2.333],
// 4 16 8.73 -0.25 2.17 8.98 -0.25 2.95 6.926 -0.25 2.333 6.863 -0.25 1.784
  [4,16,8.73,-0.25,2.17,8.98,-0.25,2.95,6.926,-0.25,2.333,6.863,-0.25,1.784],
// 4 16 8.55 -0.25 0.2 8.73 -0.25 2.17 6.863 -0.25 1.784 7.151 -0.25 -0.772
  [4,16,8.55,-0.25,0.2,8.73,-0.25,2.17,6.863,-0.25,1.784,7.151,-0.25,-0.772],
// 4 16 8.67 -0.25 -1.16 8.55 -0.25 0.2 7.151 -0.25 -0.772 7.25 -0.25 -1.447
  [4,16,8.67,-0.25,-1.16,8.55,-0.25,0.2,7.151,-0.25,-0.772,7.25,-0.25,-1.447],
// 4 16 8.73 -0.25 -1.78 8.67 -0.25 -1.16 7.25 -0.25 -1.447 7.025 -0.25 -2.626
  [4,16,8.73,-0.25,-1.78,8.67,-0.25,-1.16,7.25,-0.25,-1.447,7.025,-0.25,-2.626],
// 4 16 8.98 -0.25 -2.55 8.73 -0.25 -1.78 7.025 -0.25 -2.626 6.755 -0.25 -3.112
  [4,16,8.98,-0.25,-2.55,8.73,-0.25,-1.78,7.025,-0.25,-2.626,6.755,-0.25,-3.112],
// 4 16 9.32 -0.25 -3.18 8.98 -0.25 -2.55 6.755 -0.25 -3.112 6.377 -0.25 -3.526
  [4,16,9.32,-0.25,-3.18,8.98,-0.25,-2.55,6.755,-0.25,-3.112,6.377,-0.25,-3.526],
// 4 16 9.76 -0.25 -3.67 9.32 -0.25 -3.18 6.377 -0.25 -3.526 5.36 -0.25 -4.111
  [4,16,9.76,-0.25,-3.67,9.32,-0.25,-3.18,6.377,-0.25,-3.526,5.36,-0.25,-4.111],
// 4 16 10.31 -0.25 -4.019 9.76 -0.25 -3.67 5.36 -0.25 -4.111 4.1 -0.25 -4.3
  [4,16,10.31,-0.25,-4.019,9.76,-0.25,-3.67,5.36,-0.25,-4.111,4.1,-0.25,-4.3],
// 4 16 -3.06 -0.25 -4.23 19 -0.25 -8 4.1 -0.25 -4.3 -2.41 -0.25 -4.019
  [4,16,-3.06,-0.25,-4.23,19,-0.25,-8,4.1,-0.25,-4.3,-2.41,-0.25,-4.019],
// 4 16 -2.41 -0.25 -4.019 4.1 -0.25 -4.3 2.723 -0.25 -4.111 -1.86 -0.25 -3.67
  [4,16,-2.41,-0.25,-4.019,4.1,-0.25,-4.3,2.723,-0.25,-4.111,-1.86,-0.25,-3.67],
// 4 16 -1.86 -0.25 -3.67 2.723 -0.25 -4.111 1.751 -0.25 -3.553 -1.42 -0.25 -3.18
  [4,16,-1.86,-0.25,-3.67,2.723,-0.25,-4.111,1.751,-0.25,-3.553,-1.42,-0.25,-3.18],
// 4 16 -1.42 -0.25 -3.18 1.751 -0.25 -3.553 1.157 -0.25 -2.644 -1.08 -0.25 -2.55
  [4,16,-1.42,-0.25,-3.18,1.751,-0.25,-3.553,1.157,-0.25,-2.644,-1.08,-0.25,-2.55],
// 4 16 -1.08 -0.25 -2.55 1.157 -0.25 -2.644 0.95 -0.25 -1.384 -0.83 -0.25 -1.79
  [4,16,-1.08,-0.25,-2.55,1.157,-0.25,-2.644,0.95,-0.25,-1.384,-0.83,-0.25,-1.79],
// 4 16 -0.65 -0.25 0.18 -0.83 -0.25 -1.79 0.95 -0.25 -1.384 1.139 -0.25 1.919
  [4,16,-0.65,-0.25,0.18,-0.83,-0.25,-1.79,0.95,-0.25,-1.384,1.139,-0.25,1.919],
// 3 16 1.139 -0.25 1.919 -0.77 -0.25 1.53 -0.65 -0.25 0.18
  [3,16,1.139,-0.25,1.919,-0.77,-0.25,1.53,-0.65,-0.25,0.18],
// 4 16 -0.83 -0.25 2.15 -0.77 -0.25 1.53 1.139 -0.25 1.919 1.346 -0.25 3.098
  [4,16,-0.83,-0.25,2.15,-0.77,-0.25,1.53,1.139,-0.25,1.919,1.346,-0.25,3.098],
// 4 16 -1.09 -0.25 2.93 -0.83 -0.25 2.15 1.346 -0.25 3.098 1.922 -0.25 3.971
  [4,16,-1.09,-0.25,2.93,-0.83,-0.25,2.15,1.346,-0.25,3.098,1.922,-0.25,3.971],
// 3 16 1.922 -0.25 3.971 -1.43 -0.25 3.57 -1.09 -0.25 2.93
  [3,16,1.922,-0.25,3.971,-1.43,-0.25,3.57,-1.09,-0.25,2.93],
// 4 16 -1.88 -0.25 4.059 -1.43 -0.25 3.57 1.922 -0.25 3.971 2.84 -0.25 4.52
  [4,16,-1.88,-0.25,4.059,-1.43,-0.25,3.57,1.922,-0.25,3.971,2.84,-0.25,4.52],
// 4 16 -2.42 -0.25 4.41 -1.88 -0.25 4.059 2.84 -0.25 4.52 4.1 -0.25 4.7
  [4,16,-2.42,-0.25,4.41,-1.88,-0.25,4.059,2.84,-0.25,4.52,4.1,-0.25,4.7],
// 3 16 4.1 -0.25 4.7 -3.07 -0.25 4.63 -2.42 -0.25 4.41
  [3,16,4.1,-0.25,4.7,-3.07,-0.25,4.63,-2.42,-0.25,4.41],
];
module ldraw_lib__197895c(step=0, col=false, unit=2/5, alt=false, line=0.2, solid=!$preview)
    makepoly(ldraw_lib__197895c(), step=step, col=col, unit=unit, alt=alt, line=line, solid=solid);
ldraw_lib__197895c(line=0.2);
